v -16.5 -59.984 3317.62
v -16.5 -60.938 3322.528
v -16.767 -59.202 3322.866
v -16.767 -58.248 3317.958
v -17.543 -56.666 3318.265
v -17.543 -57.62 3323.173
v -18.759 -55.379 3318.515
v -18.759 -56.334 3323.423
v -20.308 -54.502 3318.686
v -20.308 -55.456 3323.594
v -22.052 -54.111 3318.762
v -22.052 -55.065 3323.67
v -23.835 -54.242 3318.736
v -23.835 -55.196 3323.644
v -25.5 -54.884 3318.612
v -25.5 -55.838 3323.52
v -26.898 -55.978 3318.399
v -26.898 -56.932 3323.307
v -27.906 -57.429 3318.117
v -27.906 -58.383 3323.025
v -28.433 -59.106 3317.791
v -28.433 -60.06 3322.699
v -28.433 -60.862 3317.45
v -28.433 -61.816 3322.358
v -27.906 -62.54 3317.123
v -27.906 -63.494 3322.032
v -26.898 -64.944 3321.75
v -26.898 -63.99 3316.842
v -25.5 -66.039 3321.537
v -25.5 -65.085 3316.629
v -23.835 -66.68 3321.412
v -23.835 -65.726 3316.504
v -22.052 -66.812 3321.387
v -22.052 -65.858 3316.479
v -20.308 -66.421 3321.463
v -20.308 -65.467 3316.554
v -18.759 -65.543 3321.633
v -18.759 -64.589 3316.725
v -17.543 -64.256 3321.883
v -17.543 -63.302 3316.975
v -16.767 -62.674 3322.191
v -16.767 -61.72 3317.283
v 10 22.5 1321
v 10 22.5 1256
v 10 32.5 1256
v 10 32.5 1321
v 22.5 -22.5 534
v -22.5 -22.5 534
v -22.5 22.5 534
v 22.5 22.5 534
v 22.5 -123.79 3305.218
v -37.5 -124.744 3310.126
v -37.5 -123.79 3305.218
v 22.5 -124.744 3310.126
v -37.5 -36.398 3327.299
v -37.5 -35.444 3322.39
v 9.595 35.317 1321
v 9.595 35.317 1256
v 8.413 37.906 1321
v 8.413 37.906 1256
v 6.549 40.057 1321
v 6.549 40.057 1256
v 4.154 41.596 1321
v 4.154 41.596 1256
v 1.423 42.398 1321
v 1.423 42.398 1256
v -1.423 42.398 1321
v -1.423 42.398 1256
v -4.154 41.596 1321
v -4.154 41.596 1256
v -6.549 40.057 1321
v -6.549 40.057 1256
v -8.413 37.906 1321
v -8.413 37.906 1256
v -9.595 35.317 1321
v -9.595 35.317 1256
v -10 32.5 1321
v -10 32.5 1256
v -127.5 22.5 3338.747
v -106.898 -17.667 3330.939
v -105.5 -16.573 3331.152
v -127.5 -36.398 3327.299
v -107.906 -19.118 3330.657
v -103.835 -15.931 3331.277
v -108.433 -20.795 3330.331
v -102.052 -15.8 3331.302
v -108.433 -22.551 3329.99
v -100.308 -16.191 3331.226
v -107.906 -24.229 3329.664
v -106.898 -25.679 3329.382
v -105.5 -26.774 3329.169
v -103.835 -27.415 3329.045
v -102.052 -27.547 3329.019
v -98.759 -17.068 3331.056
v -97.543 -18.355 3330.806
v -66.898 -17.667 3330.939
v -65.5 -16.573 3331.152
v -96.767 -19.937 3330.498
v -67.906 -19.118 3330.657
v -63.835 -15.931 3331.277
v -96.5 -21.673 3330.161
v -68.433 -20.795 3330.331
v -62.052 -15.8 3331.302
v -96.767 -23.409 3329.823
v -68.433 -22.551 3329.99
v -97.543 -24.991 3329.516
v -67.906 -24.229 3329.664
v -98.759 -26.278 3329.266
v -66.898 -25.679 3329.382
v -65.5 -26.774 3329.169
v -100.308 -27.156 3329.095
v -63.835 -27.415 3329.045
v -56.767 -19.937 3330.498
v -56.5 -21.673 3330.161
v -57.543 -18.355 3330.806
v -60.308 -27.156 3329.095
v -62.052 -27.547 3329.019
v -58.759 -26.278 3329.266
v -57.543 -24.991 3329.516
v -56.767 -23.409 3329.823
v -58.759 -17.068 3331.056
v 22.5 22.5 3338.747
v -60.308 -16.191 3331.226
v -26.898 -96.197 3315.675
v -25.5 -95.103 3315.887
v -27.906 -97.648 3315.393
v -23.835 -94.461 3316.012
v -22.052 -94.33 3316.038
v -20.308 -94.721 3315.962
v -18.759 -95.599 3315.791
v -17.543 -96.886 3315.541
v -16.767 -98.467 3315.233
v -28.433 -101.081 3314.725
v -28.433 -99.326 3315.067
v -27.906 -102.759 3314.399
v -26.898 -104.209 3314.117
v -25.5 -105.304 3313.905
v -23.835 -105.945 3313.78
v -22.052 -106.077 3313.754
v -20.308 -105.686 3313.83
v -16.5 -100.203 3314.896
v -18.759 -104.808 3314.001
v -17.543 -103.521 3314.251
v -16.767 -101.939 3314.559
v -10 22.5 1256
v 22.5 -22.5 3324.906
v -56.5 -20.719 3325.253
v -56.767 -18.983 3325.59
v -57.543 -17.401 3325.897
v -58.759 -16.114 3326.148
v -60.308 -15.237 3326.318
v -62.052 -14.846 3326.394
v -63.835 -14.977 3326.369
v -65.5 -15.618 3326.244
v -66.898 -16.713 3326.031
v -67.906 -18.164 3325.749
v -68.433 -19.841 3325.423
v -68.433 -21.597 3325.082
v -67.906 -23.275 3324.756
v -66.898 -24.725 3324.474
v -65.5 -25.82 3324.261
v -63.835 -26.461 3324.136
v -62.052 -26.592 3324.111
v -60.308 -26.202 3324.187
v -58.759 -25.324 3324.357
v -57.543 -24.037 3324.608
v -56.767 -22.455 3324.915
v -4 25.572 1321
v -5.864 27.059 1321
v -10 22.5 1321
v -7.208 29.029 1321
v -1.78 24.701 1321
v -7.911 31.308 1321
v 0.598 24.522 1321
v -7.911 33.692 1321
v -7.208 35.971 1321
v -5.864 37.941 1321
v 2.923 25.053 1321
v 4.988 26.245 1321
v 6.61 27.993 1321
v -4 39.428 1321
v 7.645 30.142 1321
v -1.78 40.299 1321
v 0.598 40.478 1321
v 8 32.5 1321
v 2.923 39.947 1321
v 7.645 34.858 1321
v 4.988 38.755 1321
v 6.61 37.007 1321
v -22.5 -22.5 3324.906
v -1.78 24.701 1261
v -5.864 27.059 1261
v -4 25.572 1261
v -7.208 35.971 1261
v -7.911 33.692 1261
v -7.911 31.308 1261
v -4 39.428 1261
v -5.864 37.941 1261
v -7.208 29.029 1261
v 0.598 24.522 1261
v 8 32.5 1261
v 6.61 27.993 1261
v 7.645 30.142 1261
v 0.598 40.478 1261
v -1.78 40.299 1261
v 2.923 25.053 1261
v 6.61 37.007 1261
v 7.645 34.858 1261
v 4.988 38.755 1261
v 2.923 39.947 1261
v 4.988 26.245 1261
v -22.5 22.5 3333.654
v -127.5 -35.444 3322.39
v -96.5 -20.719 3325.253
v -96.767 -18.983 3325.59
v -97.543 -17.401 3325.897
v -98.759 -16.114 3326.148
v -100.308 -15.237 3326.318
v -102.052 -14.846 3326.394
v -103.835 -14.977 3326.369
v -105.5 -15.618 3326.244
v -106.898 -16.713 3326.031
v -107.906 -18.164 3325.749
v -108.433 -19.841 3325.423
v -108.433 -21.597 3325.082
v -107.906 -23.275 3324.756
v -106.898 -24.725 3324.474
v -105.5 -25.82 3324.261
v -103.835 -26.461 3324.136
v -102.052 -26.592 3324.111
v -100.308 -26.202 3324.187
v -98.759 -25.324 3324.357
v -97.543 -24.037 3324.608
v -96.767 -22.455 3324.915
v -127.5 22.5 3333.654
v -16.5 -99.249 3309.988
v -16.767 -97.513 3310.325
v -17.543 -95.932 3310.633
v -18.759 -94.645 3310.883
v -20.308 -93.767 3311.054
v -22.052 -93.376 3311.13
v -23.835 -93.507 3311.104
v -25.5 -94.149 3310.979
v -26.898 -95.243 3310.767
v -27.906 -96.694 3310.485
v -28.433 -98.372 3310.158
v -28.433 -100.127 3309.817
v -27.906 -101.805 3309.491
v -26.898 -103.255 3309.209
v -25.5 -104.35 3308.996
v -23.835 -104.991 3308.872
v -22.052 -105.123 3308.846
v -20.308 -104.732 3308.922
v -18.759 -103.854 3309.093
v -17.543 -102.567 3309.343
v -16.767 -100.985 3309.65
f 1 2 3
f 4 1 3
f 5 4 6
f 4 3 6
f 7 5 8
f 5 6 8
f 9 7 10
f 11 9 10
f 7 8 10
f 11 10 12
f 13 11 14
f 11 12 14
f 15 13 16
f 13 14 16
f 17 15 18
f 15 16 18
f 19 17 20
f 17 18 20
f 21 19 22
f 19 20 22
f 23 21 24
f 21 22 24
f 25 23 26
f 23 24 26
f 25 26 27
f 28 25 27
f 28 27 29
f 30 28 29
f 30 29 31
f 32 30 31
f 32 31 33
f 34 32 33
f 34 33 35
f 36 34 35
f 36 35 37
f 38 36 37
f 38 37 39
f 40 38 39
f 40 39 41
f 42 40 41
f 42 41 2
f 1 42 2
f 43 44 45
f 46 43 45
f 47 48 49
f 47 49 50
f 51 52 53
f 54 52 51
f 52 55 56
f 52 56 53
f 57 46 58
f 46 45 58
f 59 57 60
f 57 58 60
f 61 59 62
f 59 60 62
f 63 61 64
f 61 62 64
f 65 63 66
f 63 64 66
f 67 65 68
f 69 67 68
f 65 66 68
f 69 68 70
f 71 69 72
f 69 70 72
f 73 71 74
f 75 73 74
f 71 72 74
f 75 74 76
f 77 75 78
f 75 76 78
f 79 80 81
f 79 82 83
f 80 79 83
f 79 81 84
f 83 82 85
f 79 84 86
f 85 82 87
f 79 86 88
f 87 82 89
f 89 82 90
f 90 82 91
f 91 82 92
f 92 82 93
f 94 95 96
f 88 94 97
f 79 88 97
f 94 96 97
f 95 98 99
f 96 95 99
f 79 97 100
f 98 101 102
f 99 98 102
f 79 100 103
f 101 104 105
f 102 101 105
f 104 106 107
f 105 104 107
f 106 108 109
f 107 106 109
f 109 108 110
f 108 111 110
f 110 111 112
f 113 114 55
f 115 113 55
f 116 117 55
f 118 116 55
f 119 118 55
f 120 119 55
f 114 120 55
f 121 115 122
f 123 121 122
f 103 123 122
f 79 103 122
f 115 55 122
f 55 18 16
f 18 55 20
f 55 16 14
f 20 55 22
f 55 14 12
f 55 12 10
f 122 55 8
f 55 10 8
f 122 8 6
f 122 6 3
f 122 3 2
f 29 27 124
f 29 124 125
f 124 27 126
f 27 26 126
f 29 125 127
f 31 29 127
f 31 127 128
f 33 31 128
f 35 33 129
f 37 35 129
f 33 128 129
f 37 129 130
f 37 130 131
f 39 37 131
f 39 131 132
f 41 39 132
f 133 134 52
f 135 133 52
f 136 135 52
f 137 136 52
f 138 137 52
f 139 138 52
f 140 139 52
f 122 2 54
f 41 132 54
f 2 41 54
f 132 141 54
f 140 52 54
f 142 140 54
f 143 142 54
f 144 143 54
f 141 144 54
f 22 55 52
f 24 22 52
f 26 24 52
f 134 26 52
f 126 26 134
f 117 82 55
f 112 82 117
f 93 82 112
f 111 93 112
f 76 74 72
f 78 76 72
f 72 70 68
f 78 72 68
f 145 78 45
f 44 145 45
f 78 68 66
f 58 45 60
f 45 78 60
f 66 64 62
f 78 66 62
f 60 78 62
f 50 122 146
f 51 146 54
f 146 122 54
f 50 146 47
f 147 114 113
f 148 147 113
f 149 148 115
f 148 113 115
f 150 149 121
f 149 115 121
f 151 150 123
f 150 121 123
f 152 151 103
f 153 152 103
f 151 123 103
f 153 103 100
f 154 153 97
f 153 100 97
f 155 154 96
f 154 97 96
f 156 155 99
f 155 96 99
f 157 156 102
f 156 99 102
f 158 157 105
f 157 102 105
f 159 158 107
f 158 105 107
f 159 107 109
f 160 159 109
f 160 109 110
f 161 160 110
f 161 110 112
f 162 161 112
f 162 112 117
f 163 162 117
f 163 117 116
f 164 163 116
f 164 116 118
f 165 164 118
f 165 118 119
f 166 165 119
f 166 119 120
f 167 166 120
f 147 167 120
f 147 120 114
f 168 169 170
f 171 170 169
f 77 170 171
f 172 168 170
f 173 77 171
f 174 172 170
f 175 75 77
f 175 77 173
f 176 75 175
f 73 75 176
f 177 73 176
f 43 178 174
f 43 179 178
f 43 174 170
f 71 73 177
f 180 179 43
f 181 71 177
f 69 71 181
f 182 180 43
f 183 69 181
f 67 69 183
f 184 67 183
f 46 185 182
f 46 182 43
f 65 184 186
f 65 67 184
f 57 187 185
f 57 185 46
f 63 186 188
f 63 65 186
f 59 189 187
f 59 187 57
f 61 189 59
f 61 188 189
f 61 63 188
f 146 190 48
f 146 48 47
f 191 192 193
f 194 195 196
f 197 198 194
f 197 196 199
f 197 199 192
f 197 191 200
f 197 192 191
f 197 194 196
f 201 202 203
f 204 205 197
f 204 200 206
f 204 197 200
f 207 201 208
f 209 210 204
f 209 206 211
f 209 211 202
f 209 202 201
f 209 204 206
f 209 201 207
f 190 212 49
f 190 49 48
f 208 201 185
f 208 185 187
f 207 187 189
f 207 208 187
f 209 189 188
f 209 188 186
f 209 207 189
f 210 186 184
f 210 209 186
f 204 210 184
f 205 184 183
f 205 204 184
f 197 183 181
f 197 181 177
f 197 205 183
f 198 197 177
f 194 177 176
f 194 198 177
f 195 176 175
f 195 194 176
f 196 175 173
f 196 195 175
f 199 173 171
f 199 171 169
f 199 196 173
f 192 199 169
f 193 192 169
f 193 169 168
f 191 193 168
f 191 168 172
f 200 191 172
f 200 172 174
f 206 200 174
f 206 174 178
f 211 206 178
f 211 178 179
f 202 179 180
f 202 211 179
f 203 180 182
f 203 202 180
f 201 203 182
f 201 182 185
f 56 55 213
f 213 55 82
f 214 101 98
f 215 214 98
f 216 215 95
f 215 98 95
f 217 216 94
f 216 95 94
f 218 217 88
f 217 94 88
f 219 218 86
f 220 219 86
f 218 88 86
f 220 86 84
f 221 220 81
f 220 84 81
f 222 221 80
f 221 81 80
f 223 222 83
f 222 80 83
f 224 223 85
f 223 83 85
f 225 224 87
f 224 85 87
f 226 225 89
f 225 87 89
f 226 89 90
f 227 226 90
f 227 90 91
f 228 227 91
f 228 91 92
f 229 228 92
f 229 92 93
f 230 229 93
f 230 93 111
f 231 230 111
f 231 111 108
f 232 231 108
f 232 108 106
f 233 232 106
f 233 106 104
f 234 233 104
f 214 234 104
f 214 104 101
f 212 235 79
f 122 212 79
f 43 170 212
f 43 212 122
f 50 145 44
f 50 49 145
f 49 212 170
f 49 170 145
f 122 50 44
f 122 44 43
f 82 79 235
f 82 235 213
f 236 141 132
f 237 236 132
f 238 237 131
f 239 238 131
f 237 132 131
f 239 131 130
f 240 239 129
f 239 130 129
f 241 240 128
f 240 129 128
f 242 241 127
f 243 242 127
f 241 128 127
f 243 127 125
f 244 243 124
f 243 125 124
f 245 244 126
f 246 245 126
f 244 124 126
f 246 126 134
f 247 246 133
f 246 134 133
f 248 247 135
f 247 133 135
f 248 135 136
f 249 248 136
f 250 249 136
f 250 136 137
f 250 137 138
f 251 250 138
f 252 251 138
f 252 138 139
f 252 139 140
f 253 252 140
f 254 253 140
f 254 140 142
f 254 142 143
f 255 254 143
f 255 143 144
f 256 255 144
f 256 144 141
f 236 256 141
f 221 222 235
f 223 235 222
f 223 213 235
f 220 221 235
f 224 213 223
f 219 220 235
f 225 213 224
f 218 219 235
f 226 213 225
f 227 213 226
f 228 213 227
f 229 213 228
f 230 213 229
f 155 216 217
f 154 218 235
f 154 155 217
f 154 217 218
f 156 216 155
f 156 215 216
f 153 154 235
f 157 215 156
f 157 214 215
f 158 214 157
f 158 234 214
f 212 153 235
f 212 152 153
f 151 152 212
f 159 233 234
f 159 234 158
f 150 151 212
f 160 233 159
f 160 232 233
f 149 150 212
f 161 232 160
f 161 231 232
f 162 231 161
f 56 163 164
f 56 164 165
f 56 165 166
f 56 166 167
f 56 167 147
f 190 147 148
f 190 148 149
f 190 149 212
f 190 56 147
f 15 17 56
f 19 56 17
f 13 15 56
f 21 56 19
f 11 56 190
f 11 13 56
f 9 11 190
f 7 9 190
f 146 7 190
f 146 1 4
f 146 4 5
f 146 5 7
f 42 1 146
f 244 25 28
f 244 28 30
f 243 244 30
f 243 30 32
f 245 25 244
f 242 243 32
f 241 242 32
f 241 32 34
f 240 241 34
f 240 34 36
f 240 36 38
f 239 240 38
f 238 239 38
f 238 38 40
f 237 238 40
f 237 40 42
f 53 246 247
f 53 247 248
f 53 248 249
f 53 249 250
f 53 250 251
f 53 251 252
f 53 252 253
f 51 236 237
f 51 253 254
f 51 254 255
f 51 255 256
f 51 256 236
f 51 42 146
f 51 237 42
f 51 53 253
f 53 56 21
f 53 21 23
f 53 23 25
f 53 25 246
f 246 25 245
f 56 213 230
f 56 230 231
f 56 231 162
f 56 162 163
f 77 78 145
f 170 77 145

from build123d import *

# Parameters (mm, degrees)
F0_W      = 45
F0_H      = 45
F1_DEPTH  = 3330
F6_W      = 45
F6_H      = 45.842251273
F7_DEPTH  = 25
F8_W      = 60
F8_H      = 60
F8_W_2    = 90
F8_H_2    = 90
F9_DEPTH  = 5
F10_R     = 6
F11_DEPTH = 25
F13_DEPTH = 5
F14_R     = 8
F15_DEPTH = 60
F16_W     = 45
F16_H     = 45
F17_DEPTH = 534
F19_DEPTH = 150.001


with BuildPart() as f1:
    # F0 (on Top) → F1 (new body)
    with BuildSketch(Plane.XY):
        Rectangle(F0_W, F0_H)
    extrude(amount=F1_DEPTH)

    # F6 (on face) → F7 (join)
    with BuildSketch(Plane(origin=(0, -624.5391596736, 3212.9754420296), x_dir=(1, 0, 0), z_dir=(0, 0.1908089954, -0.9816271834))):
        with Locations((0, -636.2284686128)):
            Rectangle(F6_W, F6_H)
    extrude(amount=F7_DEPTH)

    # F8 (on face) → F9 (join)
    with BuildSketch(Plane(origin=(0, -624.5391596736, 3212.9754420296), x_dir=(1, 0, 0), z_dir=(0, 0.1908089954, -0.9816271834))):
        with Locations((-7.5, -629.1495942493)):
            Rectangle(F8_W, F8_H)
        with Locations((-82.5, -629.1495942493)):
            Rectangle(F8_W_2, F8_H)
        with Locations((-7.5, -554.1495942493)):
            Rectangle(F8_W, F8_H_2)
    extrude(amount=F9_DEPTH)

    # F10 (on face) → F11 (cut)
    with BuildSketch(Plane(origin=(0, -624.5391596736, 3212.9754420296), x_dir=(1, 0, 0), z_dir=(0, -0.1908089954, 0.9816271834))):
        with Locations((-22.5, 534.1495942493)):
            Circle(F10_R)
        with Locations((-22.5, 574.1495942493)):
            Circle(F10_R)
        with Locations((-62.5, 614.1495942493)):
            Circle(F10_R)
        with Locations((-102.5, 614.1495942493)):
            Circle(F10_R)
    extrude(amount=-F11_DEPTH, mode=Mode.SUBTRACT)

    # F3 (on offset) → F13 (join)
    with BuildSketch(Plane.XY.offset(1256)):
        with BuildLine():
            ThreePointArc((0, 22.5), (7.0710678119, 25.4289321881), (10, 32.5))
            ThreePointArc((10, 32.5), (0, 42.5), (-10, 32.5))
            ThreePointArc((-10, 32.5), (-7.0710678119, 25.4289321881), (0, 22.5))
        make_face()
        with BuildLine():
            Line((10, 22.5), (10, 32.5))
            ThreePointArc((10, 32.5), (7.0710678119, 25.4289321881), (0, 22.5))
            Line((0, 22.5), (10, 22.5))
        make_face()
        with BuildLine():
            ThreePointArc((0, 22.5), (-7.0710678119, 25.4289321881), (-10, 32.5))
            Line((-10, 32.5), (-10, 22.5))
            Line((-10, 22.5), (0, 22.5))
        make_face()
    extrude(amount=F13_DEPTH)

    # F14 (on face) → F15 (join)
    with BuildSketch(Plane.XY.offset(1261)):
        with BuildLine():
            ThreePointArc((0, 22.5), (7.0710678119, 25.4289321881), (10, 32.5))
            ThreePointArc((10, 32.5), (0, 42.5), (-10, 32.5))
            ThreePointArc((-10, 32.5), (-7.0710678119, 25.4289321881), (0, 22.5))
        make_face()
        with Locations((0, 32.5)):
            Circle(F14_R, mode=Mode.SUBTRACT)
        with BuildLine():
            Line((10, 22.5), (10, 32.5))
            ThreePointArc((10, 32.5), (7.0710678119, 25.4289321881), (0, 22.5))
            Line((0, 22.5), (10, 22.5))
        make_face()
        with BuildLine():
            ThreePointArc((0, 22.5), (-7.0710678119, 25.4289321881), (-10, 32.5))
            Line((-10, 32.5), (-10, 22.5))
            Line((-10, 22.5), (0, 22.5))
        make_face()
    extrude(amount=F15_DEPTH)

    # F16 (on face) → F17 (cut)
    with BuildSketch(Plane(origin=(0, 0, 0), x_dir=(1, 0, 0), z_dir=(0, 0, -1))):
        Rectangle(F16_W, F16_H)
    extrude(amount=-F17_DEPTH, mode=Mode.SUBTRACT)

    # F18 (on face) → F19 (cut, through all)
    with BuildSketch(Plane.YZ.offset(22.5)):
        Polygon((22.5, 3338.7471139112), (22.5, 3313.2791965373), (27.2702248844, 3314.206434325), align=None)
    extrude(amount=-F19_DEPTH, mode=Mode.SUBTRACT)


solid = f1.part
